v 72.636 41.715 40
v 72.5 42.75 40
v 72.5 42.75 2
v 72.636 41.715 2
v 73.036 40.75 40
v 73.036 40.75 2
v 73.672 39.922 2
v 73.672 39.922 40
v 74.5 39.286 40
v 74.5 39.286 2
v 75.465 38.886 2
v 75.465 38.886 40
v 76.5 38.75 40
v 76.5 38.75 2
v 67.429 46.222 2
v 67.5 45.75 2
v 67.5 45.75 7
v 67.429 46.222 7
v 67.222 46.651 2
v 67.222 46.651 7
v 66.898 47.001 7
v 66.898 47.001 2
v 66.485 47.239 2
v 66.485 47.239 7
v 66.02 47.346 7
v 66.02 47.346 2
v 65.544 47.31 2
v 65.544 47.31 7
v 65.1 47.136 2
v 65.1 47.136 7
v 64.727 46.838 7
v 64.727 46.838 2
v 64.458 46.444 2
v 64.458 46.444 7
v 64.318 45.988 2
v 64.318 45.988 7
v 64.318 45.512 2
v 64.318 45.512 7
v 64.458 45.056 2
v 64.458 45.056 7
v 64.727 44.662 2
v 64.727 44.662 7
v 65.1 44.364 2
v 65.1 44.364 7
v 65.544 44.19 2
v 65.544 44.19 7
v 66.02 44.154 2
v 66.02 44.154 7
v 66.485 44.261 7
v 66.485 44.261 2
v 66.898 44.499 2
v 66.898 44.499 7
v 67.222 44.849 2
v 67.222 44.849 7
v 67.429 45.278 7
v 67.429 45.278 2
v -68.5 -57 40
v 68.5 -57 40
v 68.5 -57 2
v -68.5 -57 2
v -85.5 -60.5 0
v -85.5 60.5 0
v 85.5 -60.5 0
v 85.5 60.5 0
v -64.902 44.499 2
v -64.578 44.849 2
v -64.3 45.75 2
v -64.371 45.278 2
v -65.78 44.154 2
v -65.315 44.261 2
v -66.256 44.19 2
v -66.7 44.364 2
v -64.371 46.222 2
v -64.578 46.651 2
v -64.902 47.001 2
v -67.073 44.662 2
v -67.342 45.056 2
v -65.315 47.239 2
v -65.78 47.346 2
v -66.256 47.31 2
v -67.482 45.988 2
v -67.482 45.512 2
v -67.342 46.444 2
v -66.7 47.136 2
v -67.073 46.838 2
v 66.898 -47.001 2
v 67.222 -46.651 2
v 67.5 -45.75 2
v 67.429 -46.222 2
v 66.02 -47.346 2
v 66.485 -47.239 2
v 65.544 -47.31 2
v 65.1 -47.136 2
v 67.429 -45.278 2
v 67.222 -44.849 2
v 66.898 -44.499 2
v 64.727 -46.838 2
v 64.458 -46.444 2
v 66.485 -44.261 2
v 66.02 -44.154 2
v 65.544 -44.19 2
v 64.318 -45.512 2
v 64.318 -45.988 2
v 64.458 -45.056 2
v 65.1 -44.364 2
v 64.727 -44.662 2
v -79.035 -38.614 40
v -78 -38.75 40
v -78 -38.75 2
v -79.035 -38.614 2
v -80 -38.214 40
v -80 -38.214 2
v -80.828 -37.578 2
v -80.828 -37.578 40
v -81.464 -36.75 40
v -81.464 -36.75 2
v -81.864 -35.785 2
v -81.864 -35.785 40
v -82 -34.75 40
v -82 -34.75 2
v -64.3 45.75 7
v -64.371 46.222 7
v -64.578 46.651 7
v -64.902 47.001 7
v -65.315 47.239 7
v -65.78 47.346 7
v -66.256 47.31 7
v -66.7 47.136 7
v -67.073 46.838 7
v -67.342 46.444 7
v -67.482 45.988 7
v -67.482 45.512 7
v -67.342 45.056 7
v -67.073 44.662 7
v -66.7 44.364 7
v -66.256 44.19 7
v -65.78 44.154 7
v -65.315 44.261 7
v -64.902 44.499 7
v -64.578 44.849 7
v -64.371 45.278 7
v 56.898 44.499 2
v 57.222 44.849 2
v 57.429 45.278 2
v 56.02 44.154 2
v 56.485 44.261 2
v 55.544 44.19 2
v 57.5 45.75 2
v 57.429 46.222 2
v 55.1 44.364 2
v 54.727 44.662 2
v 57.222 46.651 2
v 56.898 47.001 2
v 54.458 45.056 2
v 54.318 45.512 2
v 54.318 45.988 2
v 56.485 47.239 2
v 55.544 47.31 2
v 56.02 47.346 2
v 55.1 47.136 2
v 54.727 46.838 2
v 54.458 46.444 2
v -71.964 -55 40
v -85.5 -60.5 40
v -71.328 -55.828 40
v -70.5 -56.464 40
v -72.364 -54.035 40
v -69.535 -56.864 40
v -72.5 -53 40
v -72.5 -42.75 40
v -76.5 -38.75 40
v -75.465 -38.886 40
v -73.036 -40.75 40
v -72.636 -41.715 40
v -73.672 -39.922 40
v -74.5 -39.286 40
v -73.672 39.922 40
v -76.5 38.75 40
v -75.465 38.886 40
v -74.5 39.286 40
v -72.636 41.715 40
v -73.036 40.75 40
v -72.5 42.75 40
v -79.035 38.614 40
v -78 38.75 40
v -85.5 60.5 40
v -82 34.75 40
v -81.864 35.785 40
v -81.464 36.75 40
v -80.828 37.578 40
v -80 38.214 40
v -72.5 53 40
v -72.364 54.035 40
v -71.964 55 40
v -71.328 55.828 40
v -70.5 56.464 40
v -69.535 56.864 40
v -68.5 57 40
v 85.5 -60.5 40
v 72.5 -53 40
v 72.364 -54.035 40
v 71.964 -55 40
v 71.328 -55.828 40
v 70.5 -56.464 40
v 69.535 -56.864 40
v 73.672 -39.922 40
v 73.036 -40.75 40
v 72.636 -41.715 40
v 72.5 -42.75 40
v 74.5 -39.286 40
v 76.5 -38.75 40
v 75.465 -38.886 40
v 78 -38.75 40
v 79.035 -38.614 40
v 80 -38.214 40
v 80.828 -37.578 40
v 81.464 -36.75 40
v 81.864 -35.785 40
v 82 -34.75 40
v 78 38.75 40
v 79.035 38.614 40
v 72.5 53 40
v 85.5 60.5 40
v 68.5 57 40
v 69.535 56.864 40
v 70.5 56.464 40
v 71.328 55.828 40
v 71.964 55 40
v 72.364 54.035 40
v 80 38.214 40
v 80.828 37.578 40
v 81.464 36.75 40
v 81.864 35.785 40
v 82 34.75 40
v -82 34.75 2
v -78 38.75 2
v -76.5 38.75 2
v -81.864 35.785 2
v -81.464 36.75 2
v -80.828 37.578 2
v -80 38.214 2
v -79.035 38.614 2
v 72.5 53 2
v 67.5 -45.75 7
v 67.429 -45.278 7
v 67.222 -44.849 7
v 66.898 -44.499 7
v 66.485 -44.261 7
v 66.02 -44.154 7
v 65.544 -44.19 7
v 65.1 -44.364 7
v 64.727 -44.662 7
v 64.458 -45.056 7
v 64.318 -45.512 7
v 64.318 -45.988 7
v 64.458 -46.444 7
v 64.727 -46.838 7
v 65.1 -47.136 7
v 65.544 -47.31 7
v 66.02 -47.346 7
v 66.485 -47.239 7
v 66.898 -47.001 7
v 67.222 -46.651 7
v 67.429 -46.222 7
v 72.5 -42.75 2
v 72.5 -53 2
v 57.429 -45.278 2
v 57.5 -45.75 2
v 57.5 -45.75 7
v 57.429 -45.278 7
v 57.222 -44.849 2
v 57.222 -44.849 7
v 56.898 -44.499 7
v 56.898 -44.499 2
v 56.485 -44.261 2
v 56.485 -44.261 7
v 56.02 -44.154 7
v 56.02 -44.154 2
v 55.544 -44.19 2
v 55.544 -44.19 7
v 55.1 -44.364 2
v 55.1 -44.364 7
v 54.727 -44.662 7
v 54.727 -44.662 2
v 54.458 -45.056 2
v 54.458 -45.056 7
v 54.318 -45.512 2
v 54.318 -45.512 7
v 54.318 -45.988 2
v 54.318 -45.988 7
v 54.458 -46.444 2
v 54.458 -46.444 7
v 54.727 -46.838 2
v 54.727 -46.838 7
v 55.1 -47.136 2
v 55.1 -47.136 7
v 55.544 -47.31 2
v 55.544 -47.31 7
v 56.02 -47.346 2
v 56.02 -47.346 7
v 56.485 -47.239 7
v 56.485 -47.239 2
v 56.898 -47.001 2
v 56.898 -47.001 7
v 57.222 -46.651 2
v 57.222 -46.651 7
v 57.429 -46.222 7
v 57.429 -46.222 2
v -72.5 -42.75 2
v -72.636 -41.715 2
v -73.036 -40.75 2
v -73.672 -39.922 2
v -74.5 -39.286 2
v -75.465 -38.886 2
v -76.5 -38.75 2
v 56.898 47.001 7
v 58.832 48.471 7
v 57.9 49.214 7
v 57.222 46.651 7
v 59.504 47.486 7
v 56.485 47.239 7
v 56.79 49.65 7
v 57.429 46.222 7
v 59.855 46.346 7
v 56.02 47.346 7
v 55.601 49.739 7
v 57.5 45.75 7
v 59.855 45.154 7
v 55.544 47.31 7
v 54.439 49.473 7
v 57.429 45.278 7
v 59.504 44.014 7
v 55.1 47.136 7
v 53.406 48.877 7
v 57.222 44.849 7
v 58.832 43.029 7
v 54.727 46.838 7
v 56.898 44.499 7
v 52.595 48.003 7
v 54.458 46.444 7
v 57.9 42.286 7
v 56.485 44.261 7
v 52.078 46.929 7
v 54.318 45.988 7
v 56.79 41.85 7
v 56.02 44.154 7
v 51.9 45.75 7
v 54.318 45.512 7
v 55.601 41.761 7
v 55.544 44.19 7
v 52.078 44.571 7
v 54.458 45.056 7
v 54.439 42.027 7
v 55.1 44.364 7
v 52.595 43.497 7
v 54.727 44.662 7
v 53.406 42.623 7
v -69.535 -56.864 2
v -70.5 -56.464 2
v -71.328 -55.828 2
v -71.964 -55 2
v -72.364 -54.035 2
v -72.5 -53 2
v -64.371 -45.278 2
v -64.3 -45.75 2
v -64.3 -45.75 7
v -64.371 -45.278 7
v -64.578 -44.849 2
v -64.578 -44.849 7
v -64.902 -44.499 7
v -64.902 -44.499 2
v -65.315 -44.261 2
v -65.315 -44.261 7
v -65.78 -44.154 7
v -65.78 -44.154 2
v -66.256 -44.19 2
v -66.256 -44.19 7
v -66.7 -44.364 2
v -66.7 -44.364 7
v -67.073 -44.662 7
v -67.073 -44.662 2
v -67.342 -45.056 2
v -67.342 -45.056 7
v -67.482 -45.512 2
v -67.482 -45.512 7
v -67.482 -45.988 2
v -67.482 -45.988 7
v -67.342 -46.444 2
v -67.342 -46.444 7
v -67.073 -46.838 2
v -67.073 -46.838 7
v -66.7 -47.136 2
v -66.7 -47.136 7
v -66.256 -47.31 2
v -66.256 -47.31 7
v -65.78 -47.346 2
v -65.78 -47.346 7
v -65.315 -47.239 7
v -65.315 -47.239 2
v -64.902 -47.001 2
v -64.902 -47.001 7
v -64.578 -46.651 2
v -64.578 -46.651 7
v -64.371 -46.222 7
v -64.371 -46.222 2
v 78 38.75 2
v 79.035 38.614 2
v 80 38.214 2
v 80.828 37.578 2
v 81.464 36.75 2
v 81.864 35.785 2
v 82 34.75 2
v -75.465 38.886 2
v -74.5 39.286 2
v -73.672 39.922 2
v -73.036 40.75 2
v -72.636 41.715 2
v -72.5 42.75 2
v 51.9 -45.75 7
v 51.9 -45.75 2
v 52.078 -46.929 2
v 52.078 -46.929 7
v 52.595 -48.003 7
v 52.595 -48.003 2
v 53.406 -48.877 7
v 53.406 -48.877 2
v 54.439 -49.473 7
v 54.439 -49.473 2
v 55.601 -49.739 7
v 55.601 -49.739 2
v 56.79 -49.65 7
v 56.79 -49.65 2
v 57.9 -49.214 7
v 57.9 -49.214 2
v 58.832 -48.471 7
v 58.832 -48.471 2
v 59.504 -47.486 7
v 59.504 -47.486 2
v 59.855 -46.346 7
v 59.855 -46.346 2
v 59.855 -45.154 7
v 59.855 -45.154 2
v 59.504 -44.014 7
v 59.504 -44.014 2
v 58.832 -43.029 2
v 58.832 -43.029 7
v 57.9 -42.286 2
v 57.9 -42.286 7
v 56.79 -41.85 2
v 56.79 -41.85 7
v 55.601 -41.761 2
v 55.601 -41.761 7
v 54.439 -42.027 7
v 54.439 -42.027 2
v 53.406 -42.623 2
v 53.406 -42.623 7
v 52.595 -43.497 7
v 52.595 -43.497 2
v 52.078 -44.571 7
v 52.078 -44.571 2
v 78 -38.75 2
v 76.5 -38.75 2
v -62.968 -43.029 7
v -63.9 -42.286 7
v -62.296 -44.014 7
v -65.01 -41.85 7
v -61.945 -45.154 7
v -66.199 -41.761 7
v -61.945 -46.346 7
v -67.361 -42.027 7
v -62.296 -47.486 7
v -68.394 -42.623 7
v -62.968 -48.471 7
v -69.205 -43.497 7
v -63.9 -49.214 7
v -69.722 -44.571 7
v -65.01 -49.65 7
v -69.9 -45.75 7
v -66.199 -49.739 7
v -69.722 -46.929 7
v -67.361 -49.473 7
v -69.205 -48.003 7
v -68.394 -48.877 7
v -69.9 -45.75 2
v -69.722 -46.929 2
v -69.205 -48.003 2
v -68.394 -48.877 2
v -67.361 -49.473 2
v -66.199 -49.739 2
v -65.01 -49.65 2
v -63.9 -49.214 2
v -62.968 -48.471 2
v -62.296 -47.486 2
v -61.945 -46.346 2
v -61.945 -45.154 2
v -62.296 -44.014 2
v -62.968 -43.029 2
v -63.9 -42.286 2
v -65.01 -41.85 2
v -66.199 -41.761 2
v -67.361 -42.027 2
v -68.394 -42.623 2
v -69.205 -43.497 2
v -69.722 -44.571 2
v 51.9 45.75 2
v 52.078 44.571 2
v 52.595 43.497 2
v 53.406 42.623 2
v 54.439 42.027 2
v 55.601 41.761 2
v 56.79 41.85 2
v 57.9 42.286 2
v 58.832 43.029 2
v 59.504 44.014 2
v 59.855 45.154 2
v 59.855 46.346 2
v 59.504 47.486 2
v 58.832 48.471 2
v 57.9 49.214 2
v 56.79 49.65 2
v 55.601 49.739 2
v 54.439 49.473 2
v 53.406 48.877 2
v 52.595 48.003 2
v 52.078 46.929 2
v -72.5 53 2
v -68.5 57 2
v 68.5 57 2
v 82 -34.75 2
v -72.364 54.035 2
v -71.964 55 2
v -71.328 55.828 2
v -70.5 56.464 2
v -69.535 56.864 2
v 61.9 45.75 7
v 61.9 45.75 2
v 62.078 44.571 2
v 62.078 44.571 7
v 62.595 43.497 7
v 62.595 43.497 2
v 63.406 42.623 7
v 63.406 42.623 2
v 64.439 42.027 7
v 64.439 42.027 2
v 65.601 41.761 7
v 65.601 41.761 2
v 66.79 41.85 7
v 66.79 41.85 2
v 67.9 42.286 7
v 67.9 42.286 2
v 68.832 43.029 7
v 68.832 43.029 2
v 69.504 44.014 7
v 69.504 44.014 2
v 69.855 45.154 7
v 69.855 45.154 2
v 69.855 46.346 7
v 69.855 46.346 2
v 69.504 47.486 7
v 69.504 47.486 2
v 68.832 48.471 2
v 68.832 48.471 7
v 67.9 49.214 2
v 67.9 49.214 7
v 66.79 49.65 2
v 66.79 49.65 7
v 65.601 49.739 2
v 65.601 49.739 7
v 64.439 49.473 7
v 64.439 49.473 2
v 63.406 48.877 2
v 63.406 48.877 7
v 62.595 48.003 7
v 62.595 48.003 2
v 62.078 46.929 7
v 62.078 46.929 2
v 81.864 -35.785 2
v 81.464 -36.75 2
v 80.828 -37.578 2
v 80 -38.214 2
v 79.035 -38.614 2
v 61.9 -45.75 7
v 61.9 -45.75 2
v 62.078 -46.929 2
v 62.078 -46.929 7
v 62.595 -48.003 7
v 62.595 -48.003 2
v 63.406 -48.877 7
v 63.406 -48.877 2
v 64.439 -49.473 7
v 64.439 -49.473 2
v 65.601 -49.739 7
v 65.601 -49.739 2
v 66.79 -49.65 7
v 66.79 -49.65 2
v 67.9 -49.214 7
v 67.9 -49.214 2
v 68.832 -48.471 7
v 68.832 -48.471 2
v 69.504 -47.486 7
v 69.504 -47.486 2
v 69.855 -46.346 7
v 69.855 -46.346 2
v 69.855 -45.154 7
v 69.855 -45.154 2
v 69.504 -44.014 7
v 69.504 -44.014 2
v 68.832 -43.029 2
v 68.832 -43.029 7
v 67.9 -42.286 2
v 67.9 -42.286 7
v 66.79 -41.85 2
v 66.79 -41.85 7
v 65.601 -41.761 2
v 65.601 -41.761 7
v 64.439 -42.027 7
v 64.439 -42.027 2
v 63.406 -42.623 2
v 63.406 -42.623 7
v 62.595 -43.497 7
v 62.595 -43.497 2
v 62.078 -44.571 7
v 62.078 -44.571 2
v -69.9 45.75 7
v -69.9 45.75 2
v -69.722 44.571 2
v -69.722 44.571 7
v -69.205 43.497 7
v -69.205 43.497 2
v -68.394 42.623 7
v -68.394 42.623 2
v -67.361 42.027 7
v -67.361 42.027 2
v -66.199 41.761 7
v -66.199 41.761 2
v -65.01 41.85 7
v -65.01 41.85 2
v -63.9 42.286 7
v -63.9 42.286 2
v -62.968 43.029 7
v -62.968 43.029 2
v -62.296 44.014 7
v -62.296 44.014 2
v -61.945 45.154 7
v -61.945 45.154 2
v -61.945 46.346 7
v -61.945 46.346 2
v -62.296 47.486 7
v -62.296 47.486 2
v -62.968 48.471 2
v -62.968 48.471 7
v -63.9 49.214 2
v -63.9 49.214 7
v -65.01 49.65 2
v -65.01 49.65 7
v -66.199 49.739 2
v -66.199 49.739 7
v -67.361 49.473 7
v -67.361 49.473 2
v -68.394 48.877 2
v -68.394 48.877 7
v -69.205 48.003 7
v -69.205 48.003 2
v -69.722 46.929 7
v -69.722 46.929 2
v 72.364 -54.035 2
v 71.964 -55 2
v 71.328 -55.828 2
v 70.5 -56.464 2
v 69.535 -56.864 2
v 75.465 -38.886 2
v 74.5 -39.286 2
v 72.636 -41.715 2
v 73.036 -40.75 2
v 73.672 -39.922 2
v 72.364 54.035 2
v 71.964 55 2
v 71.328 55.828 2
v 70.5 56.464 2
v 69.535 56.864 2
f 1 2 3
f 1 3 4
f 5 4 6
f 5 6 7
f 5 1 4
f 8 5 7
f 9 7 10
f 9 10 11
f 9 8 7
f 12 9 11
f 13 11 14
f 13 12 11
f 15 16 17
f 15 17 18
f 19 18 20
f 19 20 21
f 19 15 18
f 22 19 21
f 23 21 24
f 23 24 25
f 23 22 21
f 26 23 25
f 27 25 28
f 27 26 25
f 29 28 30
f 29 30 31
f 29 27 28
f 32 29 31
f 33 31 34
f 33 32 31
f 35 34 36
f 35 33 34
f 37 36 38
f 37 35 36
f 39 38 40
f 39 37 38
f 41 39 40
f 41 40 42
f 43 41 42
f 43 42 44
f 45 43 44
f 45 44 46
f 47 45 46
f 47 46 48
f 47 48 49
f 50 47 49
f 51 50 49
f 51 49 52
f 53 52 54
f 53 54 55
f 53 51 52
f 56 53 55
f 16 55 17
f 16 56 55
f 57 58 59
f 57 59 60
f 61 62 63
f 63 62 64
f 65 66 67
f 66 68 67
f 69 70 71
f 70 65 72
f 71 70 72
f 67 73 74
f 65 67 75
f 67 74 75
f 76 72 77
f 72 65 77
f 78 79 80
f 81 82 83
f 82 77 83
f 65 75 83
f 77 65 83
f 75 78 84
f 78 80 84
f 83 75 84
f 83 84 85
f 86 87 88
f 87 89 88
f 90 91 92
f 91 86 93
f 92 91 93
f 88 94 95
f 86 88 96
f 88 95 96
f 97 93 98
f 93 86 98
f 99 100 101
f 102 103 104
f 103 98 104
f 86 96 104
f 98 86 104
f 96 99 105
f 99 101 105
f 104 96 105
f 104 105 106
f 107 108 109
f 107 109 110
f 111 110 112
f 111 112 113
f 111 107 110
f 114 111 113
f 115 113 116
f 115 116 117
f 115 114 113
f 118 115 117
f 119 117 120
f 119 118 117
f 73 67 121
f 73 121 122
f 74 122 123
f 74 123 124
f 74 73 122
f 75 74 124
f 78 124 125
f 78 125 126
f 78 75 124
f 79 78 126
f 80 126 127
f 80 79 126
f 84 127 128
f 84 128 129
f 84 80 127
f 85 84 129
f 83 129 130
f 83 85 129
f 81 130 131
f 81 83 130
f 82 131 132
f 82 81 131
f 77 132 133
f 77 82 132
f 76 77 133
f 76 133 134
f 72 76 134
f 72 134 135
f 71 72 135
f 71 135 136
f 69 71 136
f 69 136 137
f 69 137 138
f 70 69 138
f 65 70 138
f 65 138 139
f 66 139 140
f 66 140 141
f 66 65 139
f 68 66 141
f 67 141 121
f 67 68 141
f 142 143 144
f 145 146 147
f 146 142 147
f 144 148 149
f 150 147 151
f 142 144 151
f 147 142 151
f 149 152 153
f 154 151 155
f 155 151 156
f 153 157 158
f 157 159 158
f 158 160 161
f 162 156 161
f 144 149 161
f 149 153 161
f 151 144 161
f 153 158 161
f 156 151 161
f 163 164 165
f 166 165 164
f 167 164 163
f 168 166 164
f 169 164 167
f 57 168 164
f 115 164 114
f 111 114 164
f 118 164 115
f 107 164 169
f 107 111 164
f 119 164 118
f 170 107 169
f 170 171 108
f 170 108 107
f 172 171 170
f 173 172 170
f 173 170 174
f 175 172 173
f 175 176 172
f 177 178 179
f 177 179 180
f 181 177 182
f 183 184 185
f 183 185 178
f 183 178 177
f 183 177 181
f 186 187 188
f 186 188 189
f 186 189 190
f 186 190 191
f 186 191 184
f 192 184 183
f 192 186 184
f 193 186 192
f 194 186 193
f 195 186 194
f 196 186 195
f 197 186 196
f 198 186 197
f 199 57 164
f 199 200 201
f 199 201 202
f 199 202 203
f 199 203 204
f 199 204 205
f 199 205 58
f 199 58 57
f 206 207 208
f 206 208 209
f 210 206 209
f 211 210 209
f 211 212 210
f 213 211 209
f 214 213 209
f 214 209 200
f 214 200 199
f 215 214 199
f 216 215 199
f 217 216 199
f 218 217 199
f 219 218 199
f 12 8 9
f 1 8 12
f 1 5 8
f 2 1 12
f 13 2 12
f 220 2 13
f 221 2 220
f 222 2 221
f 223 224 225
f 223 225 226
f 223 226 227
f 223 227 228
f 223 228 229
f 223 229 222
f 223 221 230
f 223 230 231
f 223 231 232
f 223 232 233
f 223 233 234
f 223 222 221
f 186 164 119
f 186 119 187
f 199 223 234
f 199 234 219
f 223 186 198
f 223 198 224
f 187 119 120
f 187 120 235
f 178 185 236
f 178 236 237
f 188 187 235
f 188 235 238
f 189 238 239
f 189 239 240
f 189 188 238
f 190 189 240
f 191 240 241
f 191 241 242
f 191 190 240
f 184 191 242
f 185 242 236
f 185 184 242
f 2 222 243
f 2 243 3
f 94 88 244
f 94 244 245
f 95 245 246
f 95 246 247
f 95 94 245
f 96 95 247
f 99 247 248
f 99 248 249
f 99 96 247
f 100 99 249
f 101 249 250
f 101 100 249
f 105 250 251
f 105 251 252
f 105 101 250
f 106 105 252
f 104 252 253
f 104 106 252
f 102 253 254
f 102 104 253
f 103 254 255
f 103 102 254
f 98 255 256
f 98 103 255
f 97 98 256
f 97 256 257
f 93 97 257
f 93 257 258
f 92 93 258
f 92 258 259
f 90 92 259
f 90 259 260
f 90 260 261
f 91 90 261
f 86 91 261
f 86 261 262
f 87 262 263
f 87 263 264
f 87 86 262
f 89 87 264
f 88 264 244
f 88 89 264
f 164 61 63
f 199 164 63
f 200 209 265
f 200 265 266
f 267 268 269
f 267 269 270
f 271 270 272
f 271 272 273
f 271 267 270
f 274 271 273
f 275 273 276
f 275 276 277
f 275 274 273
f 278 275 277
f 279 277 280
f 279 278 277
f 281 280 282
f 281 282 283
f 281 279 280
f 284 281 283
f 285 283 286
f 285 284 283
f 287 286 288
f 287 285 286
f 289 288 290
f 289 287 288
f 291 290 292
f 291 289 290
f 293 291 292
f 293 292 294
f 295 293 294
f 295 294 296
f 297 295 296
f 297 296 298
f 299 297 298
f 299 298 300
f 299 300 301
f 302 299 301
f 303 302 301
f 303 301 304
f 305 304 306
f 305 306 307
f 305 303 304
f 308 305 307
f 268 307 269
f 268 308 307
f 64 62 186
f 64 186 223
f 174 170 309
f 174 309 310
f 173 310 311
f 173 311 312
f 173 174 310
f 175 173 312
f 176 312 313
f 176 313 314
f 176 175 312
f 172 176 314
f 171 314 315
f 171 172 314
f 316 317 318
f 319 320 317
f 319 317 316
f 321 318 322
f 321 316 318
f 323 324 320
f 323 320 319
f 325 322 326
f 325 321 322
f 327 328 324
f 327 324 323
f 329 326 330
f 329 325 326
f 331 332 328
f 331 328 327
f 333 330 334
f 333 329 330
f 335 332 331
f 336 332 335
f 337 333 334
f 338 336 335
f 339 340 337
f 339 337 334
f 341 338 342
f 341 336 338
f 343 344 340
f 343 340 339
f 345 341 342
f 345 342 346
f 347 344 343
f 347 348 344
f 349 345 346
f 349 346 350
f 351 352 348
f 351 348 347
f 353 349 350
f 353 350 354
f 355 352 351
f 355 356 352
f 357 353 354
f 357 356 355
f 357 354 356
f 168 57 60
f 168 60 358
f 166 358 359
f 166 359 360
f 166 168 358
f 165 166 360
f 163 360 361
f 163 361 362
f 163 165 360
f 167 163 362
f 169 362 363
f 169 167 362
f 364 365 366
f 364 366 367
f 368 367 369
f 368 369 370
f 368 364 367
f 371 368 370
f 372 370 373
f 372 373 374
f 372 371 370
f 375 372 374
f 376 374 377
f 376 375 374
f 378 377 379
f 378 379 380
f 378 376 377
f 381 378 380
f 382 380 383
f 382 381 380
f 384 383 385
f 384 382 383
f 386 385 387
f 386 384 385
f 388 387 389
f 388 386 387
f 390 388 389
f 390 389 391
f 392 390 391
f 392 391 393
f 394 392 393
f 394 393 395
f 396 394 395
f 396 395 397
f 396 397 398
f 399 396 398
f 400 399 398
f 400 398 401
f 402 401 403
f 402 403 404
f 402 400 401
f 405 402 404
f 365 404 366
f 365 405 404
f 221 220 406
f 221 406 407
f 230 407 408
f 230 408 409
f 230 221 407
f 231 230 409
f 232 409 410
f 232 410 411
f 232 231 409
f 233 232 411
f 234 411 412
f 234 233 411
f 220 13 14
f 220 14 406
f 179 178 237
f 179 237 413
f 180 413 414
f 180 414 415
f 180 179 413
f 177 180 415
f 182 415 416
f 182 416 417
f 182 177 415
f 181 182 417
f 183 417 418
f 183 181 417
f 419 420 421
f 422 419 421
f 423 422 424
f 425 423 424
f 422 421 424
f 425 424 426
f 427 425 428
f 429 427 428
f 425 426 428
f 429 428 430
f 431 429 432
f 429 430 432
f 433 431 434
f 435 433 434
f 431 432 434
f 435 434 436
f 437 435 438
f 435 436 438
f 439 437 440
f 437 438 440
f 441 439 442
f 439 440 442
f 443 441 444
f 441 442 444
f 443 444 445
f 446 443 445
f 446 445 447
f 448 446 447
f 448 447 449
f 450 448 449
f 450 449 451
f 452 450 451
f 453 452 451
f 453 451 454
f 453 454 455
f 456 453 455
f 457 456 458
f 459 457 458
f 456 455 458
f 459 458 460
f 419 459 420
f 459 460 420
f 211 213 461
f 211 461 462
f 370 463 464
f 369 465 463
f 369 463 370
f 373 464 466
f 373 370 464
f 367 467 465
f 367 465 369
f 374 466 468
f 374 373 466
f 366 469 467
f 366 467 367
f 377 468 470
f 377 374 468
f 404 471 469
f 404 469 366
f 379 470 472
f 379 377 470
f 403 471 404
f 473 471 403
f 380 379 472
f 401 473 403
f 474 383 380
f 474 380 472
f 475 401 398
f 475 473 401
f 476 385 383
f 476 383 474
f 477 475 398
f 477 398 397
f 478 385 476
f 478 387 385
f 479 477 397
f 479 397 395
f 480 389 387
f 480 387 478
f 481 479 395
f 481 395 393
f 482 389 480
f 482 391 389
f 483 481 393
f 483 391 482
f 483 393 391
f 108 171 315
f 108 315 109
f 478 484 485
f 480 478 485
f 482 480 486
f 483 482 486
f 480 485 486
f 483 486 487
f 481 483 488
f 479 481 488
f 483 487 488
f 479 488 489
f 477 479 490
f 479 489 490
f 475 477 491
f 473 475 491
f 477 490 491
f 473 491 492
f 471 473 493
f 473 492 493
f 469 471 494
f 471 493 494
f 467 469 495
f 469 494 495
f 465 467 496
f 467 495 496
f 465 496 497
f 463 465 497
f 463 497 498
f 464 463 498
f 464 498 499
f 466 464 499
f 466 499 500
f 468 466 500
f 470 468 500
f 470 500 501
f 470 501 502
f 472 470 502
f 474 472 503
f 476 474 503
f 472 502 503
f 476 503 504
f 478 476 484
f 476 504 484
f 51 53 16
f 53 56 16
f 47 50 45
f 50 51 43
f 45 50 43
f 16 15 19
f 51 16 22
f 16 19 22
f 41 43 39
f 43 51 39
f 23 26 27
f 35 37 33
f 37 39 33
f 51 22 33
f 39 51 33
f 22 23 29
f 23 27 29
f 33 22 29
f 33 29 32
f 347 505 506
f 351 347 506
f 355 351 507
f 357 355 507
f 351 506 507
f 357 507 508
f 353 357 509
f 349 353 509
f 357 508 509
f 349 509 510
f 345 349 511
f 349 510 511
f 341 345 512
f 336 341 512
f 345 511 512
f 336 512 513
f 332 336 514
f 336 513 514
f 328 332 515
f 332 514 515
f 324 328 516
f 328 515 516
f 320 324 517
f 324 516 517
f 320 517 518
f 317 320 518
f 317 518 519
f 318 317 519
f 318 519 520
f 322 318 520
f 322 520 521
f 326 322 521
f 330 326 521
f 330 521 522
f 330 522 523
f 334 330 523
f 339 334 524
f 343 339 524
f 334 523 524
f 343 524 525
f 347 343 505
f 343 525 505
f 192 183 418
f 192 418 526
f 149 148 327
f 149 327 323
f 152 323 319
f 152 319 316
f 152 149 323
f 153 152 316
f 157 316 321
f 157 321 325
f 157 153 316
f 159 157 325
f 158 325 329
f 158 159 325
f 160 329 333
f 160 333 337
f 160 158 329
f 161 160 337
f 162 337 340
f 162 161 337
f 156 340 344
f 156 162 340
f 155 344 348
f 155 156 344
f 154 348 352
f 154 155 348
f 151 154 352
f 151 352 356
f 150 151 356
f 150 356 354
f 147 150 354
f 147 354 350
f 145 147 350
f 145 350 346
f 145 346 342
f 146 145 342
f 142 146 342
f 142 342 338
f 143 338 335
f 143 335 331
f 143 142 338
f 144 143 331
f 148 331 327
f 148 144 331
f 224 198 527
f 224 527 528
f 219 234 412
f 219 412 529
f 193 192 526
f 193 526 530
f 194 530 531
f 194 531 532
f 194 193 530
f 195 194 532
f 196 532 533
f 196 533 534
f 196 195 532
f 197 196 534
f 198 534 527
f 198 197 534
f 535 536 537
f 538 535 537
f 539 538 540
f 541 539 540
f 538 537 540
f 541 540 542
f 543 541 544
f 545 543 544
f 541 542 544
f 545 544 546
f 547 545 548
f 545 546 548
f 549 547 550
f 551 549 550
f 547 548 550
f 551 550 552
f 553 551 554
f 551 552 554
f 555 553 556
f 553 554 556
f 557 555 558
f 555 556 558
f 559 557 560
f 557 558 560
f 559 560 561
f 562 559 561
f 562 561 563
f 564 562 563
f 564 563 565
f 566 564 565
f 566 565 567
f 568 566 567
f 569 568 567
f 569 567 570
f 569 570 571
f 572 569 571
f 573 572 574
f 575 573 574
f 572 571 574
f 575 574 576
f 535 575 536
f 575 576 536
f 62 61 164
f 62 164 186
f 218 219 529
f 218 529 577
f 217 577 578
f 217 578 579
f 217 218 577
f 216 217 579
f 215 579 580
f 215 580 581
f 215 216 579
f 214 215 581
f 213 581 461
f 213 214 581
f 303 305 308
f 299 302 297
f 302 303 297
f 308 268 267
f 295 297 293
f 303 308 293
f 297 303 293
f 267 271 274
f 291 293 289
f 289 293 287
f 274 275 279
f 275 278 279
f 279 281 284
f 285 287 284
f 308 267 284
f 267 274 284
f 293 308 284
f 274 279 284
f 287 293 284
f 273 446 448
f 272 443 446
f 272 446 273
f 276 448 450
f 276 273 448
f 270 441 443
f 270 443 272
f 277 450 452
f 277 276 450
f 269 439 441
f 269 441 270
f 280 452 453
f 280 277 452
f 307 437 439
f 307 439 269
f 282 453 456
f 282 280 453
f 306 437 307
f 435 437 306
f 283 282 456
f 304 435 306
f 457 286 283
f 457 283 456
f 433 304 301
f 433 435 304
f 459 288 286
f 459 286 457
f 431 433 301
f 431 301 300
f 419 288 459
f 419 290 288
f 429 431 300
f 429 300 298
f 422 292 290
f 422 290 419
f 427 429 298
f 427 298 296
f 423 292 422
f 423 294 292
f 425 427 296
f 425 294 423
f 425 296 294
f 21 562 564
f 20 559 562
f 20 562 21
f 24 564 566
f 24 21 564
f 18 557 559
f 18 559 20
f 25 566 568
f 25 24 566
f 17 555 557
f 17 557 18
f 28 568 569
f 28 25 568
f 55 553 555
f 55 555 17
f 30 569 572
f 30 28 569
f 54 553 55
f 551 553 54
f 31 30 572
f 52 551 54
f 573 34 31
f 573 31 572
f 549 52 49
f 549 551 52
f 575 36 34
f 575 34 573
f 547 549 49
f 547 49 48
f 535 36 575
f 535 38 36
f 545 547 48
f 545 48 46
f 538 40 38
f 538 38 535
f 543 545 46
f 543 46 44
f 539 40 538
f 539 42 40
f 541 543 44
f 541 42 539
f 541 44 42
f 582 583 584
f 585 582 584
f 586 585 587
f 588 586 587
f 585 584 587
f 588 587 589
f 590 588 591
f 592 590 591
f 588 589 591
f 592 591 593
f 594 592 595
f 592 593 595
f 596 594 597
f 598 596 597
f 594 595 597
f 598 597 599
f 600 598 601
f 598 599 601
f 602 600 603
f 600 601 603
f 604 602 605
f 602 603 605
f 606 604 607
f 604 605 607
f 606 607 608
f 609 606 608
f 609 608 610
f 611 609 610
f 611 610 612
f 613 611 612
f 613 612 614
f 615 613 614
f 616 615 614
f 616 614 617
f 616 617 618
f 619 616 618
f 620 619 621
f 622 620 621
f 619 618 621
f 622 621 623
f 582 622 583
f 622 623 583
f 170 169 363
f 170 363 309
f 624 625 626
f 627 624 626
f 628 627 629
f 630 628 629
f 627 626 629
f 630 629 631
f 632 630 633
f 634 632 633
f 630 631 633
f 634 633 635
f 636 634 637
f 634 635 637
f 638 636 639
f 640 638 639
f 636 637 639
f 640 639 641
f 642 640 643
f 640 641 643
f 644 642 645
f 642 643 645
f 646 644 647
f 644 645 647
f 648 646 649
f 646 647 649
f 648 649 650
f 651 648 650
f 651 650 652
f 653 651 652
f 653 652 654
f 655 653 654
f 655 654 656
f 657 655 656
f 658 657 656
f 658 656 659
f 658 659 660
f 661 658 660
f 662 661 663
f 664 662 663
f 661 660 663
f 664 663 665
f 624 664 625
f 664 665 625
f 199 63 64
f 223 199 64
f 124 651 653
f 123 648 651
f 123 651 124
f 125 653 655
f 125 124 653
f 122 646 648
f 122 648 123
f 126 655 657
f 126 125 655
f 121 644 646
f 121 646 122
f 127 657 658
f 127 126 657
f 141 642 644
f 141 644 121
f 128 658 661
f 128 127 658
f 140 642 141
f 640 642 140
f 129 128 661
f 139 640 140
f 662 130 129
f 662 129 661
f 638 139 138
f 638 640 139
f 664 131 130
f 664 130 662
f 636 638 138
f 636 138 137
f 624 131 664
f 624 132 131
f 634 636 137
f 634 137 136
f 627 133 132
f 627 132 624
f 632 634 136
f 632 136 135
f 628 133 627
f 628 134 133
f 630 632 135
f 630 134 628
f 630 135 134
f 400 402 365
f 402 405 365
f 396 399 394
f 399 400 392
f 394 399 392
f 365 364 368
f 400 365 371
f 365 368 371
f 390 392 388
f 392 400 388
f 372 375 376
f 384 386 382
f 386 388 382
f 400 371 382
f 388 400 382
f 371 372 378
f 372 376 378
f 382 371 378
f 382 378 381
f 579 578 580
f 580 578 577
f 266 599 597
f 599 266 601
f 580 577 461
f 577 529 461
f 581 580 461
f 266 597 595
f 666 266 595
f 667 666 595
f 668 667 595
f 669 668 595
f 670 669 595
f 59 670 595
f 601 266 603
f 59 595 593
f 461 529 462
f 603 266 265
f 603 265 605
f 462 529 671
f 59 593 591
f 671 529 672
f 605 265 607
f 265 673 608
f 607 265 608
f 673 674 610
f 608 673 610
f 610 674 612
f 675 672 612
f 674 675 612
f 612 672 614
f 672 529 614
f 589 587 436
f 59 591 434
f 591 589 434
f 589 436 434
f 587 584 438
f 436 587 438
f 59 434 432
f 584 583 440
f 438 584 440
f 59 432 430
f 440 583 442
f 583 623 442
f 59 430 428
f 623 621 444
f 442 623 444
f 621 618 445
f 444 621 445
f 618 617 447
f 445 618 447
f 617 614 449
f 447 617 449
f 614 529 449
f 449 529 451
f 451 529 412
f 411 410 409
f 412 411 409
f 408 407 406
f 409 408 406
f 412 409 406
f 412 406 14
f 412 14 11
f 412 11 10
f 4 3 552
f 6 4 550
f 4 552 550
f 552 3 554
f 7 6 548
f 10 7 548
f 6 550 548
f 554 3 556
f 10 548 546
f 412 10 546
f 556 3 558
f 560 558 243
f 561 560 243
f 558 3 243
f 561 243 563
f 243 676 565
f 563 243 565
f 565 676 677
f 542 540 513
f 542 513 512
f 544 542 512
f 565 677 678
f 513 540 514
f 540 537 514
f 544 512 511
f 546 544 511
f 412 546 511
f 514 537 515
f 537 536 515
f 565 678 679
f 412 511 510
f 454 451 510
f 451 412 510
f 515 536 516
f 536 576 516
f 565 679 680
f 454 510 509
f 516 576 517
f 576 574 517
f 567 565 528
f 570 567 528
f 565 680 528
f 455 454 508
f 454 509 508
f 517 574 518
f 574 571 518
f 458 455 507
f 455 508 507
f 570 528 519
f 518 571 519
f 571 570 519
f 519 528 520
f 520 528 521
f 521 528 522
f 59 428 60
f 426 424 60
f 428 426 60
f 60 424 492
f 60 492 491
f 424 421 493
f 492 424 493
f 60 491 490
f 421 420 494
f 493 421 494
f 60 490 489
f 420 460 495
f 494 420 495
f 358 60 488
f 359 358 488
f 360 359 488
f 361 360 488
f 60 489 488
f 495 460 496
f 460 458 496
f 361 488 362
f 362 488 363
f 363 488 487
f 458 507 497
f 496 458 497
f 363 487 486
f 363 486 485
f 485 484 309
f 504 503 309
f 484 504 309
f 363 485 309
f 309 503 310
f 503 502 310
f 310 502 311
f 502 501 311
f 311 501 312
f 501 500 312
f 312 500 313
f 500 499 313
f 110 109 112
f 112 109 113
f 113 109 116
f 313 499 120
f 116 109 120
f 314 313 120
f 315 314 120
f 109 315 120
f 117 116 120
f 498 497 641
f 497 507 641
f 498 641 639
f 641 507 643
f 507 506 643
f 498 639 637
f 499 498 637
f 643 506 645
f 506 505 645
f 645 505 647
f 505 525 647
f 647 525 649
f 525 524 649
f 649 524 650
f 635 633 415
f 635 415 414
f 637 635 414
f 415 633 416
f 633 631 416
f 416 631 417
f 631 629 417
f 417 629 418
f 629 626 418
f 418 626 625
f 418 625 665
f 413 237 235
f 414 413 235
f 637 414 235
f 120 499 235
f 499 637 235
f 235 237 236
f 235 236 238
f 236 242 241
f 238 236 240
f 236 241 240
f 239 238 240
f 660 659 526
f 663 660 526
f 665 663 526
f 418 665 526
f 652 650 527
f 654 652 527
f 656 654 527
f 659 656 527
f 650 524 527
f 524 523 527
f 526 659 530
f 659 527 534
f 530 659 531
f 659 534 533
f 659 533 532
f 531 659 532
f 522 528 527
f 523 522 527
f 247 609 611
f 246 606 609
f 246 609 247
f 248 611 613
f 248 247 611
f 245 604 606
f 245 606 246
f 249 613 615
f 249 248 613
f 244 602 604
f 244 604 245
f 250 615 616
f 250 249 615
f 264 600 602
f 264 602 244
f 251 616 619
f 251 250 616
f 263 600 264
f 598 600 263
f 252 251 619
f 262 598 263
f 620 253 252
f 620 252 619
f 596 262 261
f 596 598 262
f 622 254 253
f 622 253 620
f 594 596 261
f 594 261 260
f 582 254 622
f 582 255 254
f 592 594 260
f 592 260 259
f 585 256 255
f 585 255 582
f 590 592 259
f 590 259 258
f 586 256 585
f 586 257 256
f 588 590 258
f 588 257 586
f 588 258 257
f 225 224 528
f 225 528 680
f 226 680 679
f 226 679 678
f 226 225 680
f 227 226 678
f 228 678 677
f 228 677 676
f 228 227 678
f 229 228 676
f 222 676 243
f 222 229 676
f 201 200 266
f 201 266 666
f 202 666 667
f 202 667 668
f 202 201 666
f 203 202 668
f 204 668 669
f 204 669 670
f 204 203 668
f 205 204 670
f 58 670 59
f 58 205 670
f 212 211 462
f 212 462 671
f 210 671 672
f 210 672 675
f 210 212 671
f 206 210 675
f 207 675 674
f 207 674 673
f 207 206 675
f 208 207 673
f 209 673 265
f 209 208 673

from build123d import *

# Parameters (mm, degrees)
SKETCH_1_W          = 171
SKETCH_1_H          = 121
EXTRUDE_1_DEPTH     = 40
CUT_EXTRUDE_1_DEPTH = 38
SKETCH_3_R          = 4
SKETCH_3_R_2        = 1.6
EXTRUDE_3_DEPTH     = 5


with BuildPart() as part:
    # Эскиз1 → Бобышка-Вытянуть1 (new body)
    with BuildSketch(Plane.XY):
        Rectangle(SKETCH_1_W, SKETCH_1_H)
    extrude(amount=EXTRUDE_1_DEPTH)

    # Эскиз2 → Вырез-Вытянуть1 (cut)
    with BuildSketch(Plane.XY.offset(40)):
        with BuildLine():
            Line((-78, 38.75), (-76.5, 38.75))
            ThreePointArc((-76.5, 38.75), (-73.671572875, 39.921572875), (-72.5, 42.75))
            Line((-72.5, 42.75), (-72.5, 53))
            ThreePointArc((-72.5, 53), (-71.328427125, 55.828427125), (-68.5, 57))
            Line((-68.5, 57), (68.5, 57))
            ThreePointArc((68.5, 57), (71.328427125, 55.828427125), (72.5, 53))
            Line((72.5, 53), (72.5, 42.75))
            ThreePointArc((72.5, 42.75), (73.671572875, 39.921572875), (76.5, 38.75))
            Line((76.5, 38.75), (78, 38.75))
            ThreePointArc((78, 38.75), (80.828427125, 37.578427125), (82, 34.75))
            Line((82, 34.75), (82, -34.75))
            ThreePointArc((82, -34.75), (80.828427125, -37.578427125), (78, -38.75))
            Line((78, -38.75), (76.5, -38.75))
            ThreePointArc((76.5, -38.75), (73.671572875, -39.921572875), (72.5, -42.75))
            Line((72.5, -42.75), (72.5, -53))
            ThreePointArc((72.5, -53), (71.328427125, -55.828427125), (68.5, -57))
            Line((68.5, -57), (-68.5, -57))
            ThreePointArc((-68.5, -57), (-71.328427125, -55.828427125), (-72.5, -53))
            Line((-72.5, -53), (-72.5, -42.75))
            ThreePointArc((-72.5, -42.75), (-73.671572875, -39.921572875), (-76.5, -38.75))
            Line((-76.5, -38.75), (-78, -38.75))
            ThreePointArc((-78, -38.75), (-80.828427125, -37.578427125), (-82, -34.75))
            Line((-82, -34.75), (-82, 34.75))
            ThreePointArc((-82, 34.75), (-80.828427125, 37.578427125), (-78, 38.75))
        make_face()
    extrude(amount=-CUT_EXTRUDE_1_DEPTH, mode=Mode.SUBTRACT)

    # Эскиз3 → Бобышка-Вытянуть3 (add)
    # profile 1 of 6: a face of its own
    with BuildSketch(Plane.XY.offset(2)):
        with Locations(Location((-65.9, 45.75, 0), (0, 0, 180))):
            Circle(SKETCH_3_R)
        with Locations((-65.9, 45.75)):
            Circle(SKETCH_3_R_2, mode=Mode.SUBTRACT)
    # profile 2 of 6: a face of its own
    with BuildSketch(Plane.XY.offset(2)):
        with Locations(Location((65.9, 45.75, 0), (0, 0, 180))):
            Circle(SKETCH_3_R)
        with Locations((65.9, 45.75)):
            Circle(SKETCH_3_R_2, mode=Mode.SUBTRACT)
    # profile 3 of 6: a face of its own
    with BuildSketch(Plane.XY.offset(2)):
        with Locations(Location((65.9, -45.75, 0), (0, 0, 180))):
            Circle(SKETCH_3_R)
        with Locations((65.9, -45.75)):
            Circle(SKETCH_3_R_2, mode=Mode.SUBTRACT)
    # profile 4 of 6: a face of its own
    with BuildSketch(Plane.XY.offset(2)):
        with Locations(Location((-65.9, -45.75, 0), (0, 0, 180))):
            Circle(SKETCH_3_R)
        with Locations((-65.9, -45.75)):
            Circle(SKETCH_3_R_2, mode=Mode.SUBTRACT)
    # profile 5 of 6: a face of its own
    with BuildSketch(Plane.XY.offset(2)):
        with Locations(Location((55.9, -45.75, 0), (0, 0, 180))):
            Circle(SKETCH_3_R)
        with Locations((55.9, -45.75)):
            Circle(SKETCH_3_R_2, mode=Mode.SUBTRACT)
    # profile 6 of 6: a face of its own
    with BuildSketch(Plane.XY.offset(2)):
        with Locations(Location((55.9, 45.75, 0), (0, 0, 180))):
            Circle(SKETCH_3_R)
        with Locations((55.9, 45.75)):
            Circle(SKETCH_3_R_2, mode=Mode.SUBTRACT)
    extrude(amount=EXTRUDE_3_DEPTH)


solid = part.part
